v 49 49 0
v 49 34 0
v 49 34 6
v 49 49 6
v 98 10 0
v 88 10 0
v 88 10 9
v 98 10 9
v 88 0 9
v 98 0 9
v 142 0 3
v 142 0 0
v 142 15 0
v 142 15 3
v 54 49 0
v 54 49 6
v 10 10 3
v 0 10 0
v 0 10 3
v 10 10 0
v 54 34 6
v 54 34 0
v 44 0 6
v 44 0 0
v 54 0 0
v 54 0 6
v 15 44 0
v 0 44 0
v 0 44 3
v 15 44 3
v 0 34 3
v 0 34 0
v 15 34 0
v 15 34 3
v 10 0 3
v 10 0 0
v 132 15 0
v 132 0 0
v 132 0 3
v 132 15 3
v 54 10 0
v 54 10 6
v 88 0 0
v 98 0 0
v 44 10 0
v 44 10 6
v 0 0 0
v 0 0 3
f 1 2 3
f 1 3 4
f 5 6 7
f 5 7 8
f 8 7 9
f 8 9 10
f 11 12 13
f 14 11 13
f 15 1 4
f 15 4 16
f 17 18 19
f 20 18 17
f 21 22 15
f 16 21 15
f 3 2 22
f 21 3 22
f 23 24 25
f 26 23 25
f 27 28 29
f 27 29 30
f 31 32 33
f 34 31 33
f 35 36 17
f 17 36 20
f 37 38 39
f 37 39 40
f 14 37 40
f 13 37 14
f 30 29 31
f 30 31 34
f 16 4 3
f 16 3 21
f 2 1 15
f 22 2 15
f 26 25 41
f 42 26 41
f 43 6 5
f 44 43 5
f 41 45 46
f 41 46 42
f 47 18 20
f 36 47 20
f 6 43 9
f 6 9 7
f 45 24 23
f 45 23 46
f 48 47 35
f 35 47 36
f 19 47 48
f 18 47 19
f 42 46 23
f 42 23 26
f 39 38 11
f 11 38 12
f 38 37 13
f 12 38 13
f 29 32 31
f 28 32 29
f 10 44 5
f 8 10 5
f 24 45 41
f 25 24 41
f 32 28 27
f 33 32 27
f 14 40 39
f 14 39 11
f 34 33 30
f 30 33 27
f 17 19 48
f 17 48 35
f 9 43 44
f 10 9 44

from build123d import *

# Parameters (mm, degrees)
BOX_W        = 10
BOX_H        = 10
BOX_DEPTH    = 3
BOX001_W     = 10
BOX001_H     = 10
BOX001_DEPTH = 6
BOX002_W     = 10
BOX002_H     = 10
BOX002_DEPTH = 9
BOX003_W     = 10
BOX003_H     = 15
BOX003_DEPTH = 3
BOX004_W     = 15
BOX004_H     = 10
BOX004_DEPTH = 3
BOX005_W     = 5
BOX005_H     = 15
BOX005_DEPTH = 6


with BuildPart() as cube:
    # Box → Box (new body)
    with BuildSketch(Plane.XY):
        with Locations((5, 5)):
            Rectangle(BOX_W, BOX_H)
    extrude(amount=BOX_DEPTH)


with BuildPart() as cube001:
    # Box001 → Box001 (new body)
    with BuildSketch(Plane(origin=(44, 0, 0), x_dir=(1, 0, 0), z_dir=(0, 0, 1))):
        with Locations((5, 5)):
            Rectangle(BOX001_W, BOX001_H)
    extrude(amount=BOX001_DEPTH)


with BuildPart() as cube002:
    # Box002 → Box002 (new body)
    with BuildSketch(Plane(origin=(88, 0, 0), x_dir=(1, 0, 0), z_dir=(0, 0, 1))):
        with Locations((5, 5)):
            Rectangle(BOX002_W, BOX002_H)
    extrude(amount=BOX002_DEPTH)


with BuildPart() as cube003:
    # Box003 → Box003 (new body)
    with BuildSketch(Plane(origin=(132, 0, 0), x_dir=(1, 0, 0), z_dir=(0, 0, 1))):
        with Locations((5, 7.5)):
            Rectangle(BOX003_W, BOX003_H)
    extrude(amount=BOX003_DEPTH)


with BuildPart() as cube004:
    # Box004 → Box004 (new body)
    with BuildSketch(Plane(origin=(0, 34, 0), x_dir=(1, 0, 0), z_dir=(0, 0, 1))):
        with Locations((7.5, 5)):
            Rectangle(BOX004_W, BOX004_H)
    extrude(amount=BOX004_DEPTH)


with BuildPart() as cube005:
    # Box005 → Box005 (new body)
    with BuildSketch(Plane(origin=(49, 34, 0), x_dir=(1, 0, 0), z_dir=(0, 0, 1))):
        with Locations((2.5, 7.5)):
            Rectangle(BOX005_W, BOX005_H)
    extrude(amount=BOX005_DEPTH)


solid = Compound([cube.part, cube001.part, cube002.part, cube003.part, cube004.part, cube005.part])
